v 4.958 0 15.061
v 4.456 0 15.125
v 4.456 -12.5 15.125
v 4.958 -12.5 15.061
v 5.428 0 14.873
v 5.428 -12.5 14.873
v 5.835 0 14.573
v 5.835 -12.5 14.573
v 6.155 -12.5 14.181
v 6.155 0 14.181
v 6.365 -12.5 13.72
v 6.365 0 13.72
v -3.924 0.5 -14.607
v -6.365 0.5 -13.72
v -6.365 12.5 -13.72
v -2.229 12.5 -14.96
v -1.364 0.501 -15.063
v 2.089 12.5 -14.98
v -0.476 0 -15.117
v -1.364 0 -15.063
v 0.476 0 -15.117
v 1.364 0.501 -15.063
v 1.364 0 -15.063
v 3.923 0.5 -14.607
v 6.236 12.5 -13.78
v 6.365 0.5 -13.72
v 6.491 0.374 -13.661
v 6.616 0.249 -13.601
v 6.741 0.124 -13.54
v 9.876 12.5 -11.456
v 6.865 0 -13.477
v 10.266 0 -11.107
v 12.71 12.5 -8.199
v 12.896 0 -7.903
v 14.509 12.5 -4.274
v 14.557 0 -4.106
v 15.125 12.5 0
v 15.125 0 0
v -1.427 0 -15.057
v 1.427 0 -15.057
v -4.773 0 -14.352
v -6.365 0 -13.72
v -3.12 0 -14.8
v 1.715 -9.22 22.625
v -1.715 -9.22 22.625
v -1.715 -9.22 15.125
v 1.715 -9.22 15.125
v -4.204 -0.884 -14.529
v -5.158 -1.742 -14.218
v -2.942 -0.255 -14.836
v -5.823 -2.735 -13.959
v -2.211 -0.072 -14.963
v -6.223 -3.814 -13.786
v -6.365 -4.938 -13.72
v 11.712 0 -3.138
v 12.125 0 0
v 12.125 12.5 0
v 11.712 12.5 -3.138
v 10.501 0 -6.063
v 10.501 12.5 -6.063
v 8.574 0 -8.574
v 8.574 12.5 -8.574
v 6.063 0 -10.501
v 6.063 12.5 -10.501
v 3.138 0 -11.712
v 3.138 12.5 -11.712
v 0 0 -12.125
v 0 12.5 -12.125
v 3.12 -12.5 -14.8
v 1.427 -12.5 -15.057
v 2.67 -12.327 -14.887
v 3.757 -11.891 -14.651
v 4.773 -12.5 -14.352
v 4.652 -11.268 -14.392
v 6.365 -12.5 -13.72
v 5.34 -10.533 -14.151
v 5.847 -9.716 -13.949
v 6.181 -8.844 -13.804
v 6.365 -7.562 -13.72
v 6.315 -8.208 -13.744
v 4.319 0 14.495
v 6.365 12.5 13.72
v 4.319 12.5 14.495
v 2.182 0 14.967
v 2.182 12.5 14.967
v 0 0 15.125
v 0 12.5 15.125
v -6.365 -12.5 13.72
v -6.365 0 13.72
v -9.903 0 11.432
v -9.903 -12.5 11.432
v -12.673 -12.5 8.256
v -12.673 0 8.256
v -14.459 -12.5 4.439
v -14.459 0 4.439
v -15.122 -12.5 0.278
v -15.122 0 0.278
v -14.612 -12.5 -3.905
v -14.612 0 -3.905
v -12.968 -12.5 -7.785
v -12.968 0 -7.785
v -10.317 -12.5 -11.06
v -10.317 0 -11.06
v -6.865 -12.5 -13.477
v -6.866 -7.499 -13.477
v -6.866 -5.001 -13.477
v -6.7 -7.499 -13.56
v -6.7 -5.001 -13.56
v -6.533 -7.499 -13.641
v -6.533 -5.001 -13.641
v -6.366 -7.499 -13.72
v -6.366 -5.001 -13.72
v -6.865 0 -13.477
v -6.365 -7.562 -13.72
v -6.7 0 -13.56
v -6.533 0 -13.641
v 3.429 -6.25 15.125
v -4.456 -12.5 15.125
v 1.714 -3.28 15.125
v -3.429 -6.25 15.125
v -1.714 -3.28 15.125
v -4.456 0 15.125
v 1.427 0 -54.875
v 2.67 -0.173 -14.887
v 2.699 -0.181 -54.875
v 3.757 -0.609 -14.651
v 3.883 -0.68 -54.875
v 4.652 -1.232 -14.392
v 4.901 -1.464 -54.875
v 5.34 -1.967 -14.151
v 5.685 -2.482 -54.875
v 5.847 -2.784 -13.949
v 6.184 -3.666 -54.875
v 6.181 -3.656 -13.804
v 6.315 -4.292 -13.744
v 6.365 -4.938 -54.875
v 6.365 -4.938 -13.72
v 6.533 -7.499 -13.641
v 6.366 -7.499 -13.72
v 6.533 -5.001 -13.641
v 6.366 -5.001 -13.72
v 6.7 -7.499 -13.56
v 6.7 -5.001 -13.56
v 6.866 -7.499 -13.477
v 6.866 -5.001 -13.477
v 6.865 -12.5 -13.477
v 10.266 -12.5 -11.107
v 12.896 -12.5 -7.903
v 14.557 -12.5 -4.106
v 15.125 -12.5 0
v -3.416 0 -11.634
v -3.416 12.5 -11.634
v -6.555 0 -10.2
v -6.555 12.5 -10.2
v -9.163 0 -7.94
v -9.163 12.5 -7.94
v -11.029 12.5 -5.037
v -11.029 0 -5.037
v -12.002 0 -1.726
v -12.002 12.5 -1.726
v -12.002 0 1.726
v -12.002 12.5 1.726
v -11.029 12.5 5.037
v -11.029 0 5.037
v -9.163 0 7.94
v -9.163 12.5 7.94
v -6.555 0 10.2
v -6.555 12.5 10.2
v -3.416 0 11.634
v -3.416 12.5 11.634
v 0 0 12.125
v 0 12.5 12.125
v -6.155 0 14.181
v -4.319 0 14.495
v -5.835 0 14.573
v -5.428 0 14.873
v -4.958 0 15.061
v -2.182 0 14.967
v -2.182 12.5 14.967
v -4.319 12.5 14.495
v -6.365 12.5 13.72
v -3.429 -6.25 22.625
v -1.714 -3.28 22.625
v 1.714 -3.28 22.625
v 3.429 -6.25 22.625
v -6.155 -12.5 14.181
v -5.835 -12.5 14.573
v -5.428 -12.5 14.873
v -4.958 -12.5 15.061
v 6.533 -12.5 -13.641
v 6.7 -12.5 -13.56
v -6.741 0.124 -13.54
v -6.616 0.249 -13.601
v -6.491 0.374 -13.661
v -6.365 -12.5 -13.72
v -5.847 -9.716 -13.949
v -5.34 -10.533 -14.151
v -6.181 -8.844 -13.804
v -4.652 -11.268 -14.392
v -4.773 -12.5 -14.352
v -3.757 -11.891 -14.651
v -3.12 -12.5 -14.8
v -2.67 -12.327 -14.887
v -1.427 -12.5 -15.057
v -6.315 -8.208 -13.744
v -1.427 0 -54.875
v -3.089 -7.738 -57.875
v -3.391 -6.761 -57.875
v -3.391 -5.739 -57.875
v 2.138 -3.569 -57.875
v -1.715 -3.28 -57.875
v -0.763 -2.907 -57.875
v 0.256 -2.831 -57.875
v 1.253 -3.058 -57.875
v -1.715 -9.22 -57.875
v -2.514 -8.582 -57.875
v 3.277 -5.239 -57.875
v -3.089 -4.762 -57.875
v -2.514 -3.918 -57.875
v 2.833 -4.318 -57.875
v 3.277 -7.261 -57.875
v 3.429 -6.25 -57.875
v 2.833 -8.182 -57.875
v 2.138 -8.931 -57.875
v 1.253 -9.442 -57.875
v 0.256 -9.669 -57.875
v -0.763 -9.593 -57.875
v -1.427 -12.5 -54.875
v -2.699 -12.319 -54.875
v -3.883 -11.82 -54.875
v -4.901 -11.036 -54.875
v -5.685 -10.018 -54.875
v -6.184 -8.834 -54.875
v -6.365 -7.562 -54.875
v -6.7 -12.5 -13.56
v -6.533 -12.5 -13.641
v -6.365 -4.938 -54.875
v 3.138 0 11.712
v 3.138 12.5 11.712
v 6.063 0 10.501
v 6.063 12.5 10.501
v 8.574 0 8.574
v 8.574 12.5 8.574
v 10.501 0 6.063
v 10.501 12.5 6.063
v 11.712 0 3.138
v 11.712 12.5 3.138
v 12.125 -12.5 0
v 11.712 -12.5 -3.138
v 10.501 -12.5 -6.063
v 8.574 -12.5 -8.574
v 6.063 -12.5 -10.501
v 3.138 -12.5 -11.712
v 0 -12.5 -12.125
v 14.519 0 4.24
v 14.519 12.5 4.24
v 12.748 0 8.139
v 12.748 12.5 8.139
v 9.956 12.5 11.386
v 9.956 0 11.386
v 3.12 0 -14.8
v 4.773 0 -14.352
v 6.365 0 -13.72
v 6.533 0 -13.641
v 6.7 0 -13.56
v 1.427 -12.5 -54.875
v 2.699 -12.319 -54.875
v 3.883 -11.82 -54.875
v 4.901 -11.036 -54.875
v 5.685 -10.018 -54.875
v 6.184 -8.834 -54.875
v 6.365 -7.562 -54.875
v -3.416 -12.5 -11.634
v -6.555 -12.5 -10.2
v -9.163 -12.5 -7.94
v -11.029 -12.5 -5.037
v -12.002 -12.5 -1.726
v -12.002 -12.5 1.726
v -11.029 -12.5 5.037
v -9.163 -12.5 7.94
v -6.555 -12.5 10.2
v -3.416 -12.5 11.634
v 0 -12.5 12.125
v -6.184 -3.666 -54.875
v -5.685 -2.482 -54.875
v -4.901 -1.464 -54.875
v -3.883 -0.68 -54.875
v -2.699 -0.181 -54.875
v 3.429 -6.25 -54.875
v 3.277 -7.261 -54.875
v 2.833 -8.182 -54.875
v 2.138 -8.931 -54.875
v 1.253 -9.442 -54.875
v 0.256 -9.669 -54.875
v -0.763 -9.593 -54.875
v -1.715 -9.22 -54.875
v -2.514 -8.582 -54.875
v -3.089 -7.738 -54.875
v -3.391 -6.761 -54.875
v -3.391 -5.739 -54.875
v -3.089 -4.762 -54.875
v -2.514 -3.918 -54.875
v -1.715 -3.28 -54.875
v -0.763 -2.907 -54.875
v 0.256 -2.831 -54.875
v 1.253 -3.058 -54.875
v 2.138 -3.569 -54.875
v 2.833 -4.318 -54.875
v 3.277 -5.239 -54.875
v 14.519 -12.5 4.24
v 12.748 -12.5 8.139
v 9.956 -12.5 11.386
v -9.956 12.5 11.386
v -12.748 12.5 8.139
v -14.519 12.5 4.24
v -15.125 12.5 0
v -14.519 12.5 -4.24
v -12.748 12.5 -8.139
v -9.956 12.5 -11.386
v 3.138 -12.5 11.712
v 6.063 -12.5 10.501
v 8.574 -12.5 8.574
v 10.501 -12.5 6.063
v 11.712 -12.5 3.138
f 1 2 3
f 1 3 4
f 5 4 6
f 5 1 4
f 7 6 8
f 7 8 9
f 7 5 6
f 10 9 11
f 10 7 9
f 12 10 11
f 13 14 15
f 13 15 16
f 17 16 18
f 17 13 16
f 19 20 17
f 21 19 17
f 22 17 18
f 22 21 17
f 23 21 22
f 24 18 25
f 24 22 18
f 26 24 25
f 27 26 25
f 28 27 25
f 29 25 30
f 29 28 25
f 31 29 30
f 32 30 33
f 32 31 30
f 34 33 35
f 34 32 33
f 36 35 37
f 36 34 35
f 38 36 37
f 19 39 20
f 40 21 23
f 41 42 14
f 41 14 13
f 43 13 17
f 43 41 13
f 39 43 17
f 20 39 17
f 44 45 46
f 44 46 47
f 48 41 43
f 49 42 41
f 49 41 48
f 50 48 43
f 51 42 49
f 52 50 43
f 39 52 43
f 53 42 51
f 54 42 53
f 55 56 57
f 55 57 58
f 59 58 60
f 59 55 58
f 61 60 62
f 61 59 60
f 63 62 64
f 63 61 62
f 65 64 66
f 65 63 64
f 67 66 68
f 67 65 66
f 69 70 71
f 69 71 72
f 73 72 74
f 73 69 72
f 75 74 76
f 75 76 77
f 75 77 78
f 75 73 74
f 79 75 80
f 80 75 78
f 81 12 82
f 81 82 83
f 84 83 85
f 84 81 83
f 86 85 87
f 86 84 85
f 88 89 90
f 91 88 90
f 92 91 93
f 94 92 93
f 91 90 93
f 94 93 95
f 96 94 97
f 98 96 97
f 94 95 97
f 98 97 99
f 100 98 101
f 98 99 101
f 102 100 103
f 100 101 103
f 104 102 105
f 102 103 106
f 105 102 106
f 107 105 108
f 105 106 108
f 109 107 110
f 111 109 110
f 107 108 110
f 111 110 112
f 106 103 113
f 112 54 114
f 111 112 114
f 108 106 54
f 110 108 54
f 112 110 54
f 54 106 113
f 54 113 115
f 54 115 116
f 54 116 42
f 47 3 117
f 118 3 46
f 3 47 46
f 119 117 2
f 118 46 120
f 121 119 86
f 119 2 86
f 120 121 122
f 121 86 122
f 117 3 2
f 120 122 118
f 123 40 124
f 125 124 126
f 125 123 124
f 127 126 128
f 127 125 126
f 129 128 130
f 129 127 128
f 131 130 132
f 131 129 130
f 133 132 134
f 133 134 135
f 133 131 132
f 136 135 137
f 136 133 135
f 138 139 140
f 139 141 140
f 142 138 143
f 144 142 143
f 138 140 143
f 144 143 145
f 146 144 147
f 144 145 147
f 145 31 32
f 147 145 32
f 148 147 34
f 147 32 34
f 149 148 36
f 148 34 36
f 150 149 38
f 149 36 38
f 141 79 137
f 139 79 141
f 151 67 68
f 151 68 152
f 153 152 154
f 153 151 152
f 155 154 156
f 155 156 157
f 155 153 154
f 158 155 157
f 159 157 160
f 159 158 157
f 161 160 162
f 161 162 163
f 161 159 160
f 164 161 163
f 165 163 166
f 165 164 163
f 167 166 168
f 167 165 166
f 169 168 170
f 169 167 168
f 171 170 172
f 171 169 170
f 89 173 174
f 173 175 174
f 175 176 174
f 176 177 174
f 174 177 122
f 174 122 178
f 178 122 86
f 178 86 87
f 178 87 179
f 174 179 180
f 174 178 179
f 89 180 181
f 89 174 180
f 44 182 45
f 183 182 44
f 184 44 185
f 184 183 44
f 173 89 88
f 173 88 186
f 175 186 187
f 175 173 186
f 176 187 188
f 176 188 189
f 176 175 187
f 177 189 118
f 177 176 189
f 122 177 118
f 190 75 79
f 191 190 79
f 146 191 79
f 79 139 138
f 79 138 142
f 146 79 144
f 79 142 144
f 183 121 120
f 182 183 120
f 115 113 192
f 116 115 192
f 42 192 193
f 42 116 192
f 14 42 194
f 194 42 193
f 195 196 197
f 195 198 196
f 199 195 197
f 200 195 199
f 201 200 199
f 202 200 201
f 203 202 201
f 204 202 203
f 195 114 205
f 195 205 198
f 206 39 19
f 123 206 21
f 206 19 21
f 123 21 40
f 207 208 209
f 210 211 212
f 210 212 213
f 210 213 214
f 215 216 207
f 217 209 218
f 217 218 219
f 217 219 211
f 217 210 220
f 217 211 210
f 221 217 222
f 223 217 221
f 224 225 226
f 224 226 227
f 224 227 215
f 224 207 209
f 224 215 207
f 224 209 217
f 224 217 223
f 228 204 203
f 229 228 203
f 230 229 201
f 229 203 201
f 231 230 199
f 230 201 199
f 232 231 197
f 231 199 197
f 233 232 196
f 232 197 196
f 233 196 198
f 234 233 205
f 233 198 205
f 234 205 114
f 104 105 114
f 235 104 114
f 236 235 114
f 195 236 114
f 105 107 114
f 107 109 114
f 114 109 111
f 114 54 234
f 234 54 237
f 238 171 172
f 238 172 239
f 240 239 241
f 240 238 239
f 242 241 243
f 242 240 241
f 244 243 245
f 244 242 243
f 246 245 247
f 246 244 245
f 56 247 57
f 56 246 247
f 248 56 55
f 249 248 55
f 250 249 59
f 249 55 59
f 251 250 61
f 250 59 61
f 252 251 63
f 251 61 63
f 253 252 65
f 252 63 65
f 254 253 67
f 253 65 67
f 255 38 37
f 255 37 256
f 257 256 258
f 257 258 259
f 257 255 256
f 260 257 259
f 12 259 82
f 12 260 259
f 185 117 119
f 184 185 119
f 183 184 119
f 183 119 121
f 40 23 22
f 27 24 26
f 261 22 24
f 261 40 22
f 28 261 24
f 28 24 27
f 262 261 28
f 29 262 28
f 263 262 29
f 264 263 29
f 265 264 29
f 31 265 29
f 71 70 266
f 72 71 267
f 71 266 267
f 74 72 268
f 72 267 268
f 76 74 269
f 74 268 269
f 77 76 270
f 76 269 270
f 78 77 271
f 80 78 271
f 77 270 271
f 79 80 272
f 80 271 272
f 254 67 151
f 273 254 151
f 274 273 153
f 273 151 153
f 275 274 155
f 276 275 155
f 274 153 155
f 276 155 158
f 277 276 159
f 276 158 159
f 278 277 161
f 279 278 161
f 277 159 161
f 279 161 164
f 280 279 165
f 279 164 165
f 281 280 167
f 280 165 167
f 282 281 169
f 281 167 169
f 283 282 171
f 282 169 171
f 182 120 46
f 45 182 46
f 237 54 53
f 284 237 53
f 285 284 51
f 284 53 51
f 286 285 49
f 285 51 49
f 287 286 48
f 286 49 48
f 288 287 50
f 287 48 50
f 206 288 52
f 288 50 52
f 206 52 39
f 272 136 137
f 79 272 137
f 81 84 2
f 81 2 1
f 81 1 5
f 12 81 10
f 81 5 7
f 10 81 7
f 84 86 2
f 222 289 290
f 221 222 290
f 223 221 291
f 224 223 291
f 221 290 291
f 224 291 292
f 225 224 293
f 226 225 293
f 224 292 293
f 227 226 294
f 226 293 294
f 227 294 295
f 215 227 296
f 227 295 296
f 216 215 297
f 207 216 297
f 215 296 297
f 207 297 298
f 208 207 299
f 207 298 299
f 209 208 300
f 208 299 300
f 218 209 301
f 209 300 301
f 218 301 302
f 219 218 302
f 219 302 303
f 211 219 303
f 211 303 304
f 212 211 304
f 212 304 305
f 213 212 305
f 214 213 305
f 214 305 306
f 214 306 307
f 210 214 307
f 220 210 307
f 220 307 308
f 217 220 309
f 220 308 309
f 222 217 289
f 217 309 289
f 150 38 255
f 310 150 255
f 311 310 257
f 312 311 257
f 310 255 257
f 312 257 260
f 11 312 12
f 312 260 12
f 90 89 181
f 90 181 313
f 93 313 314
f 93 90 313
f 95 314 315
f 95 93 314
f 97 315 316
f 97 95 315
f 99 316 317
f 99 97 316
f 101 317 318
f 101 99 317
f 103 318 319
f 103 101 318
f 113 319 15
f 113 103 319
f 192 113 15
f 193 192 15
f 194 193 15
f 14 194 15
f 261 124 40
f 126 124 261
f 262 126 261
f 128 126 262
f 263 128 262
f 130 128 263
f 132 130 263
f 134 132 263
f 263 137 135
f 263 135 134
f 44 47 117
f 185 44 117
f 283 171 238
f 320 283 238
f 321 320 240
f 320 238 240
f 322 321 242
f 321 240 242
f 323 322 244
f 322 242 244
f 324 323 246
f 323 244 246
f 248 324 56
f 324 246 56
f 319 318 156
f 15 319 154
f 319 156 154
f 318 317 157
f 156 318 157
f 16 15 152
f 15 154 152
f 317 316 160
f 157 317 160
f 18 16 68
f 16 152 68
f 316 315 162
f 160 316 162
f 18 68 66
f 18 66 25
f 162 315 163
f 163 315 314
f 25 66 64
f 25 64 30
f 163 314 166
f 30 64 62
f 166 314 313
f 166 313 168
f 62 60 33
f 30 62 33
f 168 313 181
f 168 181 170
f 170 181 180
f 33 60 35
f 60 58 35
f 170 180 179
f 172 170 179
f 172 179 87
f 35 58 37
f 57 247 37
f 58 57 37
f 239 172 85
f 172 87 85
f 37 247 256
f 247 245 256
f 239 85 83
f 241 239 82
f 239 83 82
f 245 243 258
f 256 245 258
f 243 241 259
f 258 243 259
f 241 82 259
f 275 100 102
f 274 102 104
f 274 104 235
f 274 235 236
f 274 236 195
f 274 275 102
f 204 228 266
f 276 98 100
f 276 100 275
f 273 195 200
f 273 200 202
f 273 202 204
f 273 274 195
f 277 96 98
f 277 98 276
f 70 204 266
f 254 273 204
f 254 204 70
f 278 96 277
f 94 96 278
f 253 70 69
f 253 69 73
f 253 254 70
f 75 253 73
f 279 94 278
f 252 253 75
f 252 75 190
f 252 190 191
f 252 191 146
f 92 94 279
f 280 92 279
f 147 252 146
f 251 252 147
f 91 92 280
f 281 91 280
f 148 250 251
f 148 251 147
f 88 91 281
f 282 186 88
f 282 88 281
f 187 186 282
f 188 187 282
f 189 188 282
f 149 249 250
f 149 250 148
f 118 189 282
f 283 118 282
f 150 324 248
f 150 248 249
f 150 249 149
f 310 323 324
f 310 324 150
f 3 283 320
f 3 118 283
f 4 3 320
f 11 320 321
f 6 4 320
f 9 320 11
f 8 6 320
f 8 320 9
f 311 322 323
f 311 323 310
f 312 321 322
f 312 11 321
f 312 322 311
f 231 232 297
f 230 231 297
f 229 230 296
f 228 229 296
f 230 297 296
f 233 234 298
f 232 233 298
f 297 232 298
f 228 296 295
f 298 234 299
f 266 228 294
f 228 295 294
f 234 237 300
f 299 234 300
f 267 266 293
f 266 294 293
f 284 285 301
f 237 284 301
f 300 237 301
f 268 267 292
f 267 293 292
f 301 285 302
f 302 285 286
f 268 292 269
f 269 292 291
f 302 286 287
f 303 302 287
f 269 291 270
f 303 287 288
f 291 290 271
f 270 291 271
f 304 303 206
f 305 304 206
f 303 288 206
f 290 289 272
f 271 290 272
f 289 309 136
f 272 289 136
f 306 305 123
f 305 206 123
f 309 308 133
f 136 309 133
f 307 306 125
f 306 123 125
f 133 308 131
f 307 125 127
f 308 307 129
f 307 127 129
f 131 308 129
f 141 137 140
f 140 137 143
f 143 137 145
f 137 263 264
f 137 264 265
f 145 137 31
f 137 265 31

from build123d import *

# Parameters (mm, degrees)
F1_DEPTH     = 12.5
F2_DEPTH     = 12.5
F3_DEPTH     = 12.5
F6_DEPTH     = 7.5
F5_R         = 3.429
F7_DEPTH     = 3
F8_T4_DEPTH  = 66.159380005
F8_S5_R      = 15.125
F8_T6_DEPTH  = 35
F8_T10_DEPTH = 66.159380005
F8_S11_R     = 15.125
F8_T12_DEPTH = 35
F8_T16_DEPTH = 66.159380005
F8_S17_R     = 15.125
F8_T18_DEPTH = 35
F8_T22_DEPTH = 66.159380005
F8_S23_R     = 15.125
F8_T24_DEPTH = 35
F9_T1_DEPTH  = 22.0465191056


# Not quite as in the source:
# - a fillet or chamfer that OpenCascade refuses, or shapes differently, is made with other operations: its cross-section is extruded or revolved along the edge and cut away or added


with BuildPart() as f1:
    # F0 (on Front) → F1 (new body, symmetric)
    with BuildSketch(Plane.XZ):
        with BuildLine():
            Line((-6.3651329838, -12.125), (-6.3651329838, -13.7204485021))
            ThreePointArc((-6.3651329838, -13.7204485021), (0, -15.125), (6.3651329838, -13.7204485021))
            Line((6.3651329838, -13.7204485021), (6.3651329838, -12.125))
            Line((6.3651329838, -12.125), (0, -12.125))
            Line((0, -12.125), (-6.3651329838, -12.125))
        make_face()
        with BuildLine():
            ThreePointArc((6.3651329838, 13.7204485021), (3.2591288258, 14.7696887001), (0, 15.125))
            ThreePointArc((0, 15.125), (-3.2591288258, 14.7696887001), (-6.3651329838, 13.7204485021))
            Line((-6.3651329838, 13.7204485021), (-6.3651329838, 12.125))
            Line((-6.3651329838, 12.125), (0, 12.125))
            Line((0, 12.125), (6.3651329838, 12.125))
            Line((6.3651329838, 12.125), (6.3651329838, 13.7204485021))
        make_face()
        with BuildLine():
            ThreePointArc((15.125, 0), (12.7482991293, 8.1391949424), (6.3651329838, 13.7204485021))
            Line((6.3651329838, 13.7204485021), (6.3651329838, 12.125))
            Line((6.3651329838, 12.125), (0, 12.125))
            ThreePointArc((0, 12.125), (8.5736697219, 8.5736697219), (12.125, 0))
            ThreePointArc((12.125, 0), (8.5736697219, -8.5736697219), (0, -12.125))
            Line((0, -12.125), (6.3651329838, -12.125))
            Line((6.3651329838, -12.125), (6.3651329838, -13.7204485021))
            ThreePointArc((6.3651329838, -13.7204485021), (12.7482991293, -8.1391949424), (15.125, 0))
        make_face()
        with BuildLine():
            Line((-6.3651329838, 12.125), (-6.3651329838, 13.7204485021))
            ThreePointArc((-6.3651329838, 13.7204485021), (-15.125, 0), (-6.3651329838, -13.7204485021))
            Line((-6.3651329838, -13.7204485021), (-6.3651329838, -12.125))
            Line((-6.3651329838, -12.125), (0, -12.125))
            ThreePointArc((0, -12.125), (-12.125, 0), (0, 12.125))
            Line((0, 12.125), (-6.3651329838, 12.125))
        make_face()
    extrude(amount=F1_DEPTH, both=True)

    # F0 (on Front) → F2 (join, through all)
    with BuildSketch(Plane.XZ):
        with BuildLine():
            ThreePointArc((6.3651329838, -13.7204485021), (0, -15.125), (-6.3651329838, -13.7204485021))
            Line((-6.3651329838, -13.7204485021), (-6.3651329838, -54.875))
            Line((-6.3651329838, -54.875), (6.3651329838, -54.875))
            Line((6.3651329838, -54.875), (6.3651329838, -13.7204485021))
        make_face()
    extrude(amount=F2_DEPTH)

    # F0 (on Front) → F3 (join, through all)
    with BuildSketch(Plane.XZ):
        with BuildLine():
            Line((6.3651329838, 15.125), (0, 15.125))
            ThreePointArc((0, 15.125), (3.2591288258, 14.7696887001), (6.3651329838, 13.7204485021))
            Line((6.3651329838, 13.7204485021), (6.3651329838, 15.125))
        make_face()
        with BuildLine():
            Line((0, 15.125), (-6.3651329838, 15.125))
            Line((-6.3651329838, 15.125), (-6.3651329838, 13.7204485021))
            ThreePointArc((-6.3651329838, 13.7204485021), (-3.2591288258, 14.7696887001), (0, 15.125))
        make_face()
    extrude(amount=F3_DEPTH)

    # F4 (on face) → F6 (join)
    with BuildSketch(Plane.XY.offset(15.125)):
        Polygon((1.7145000001, -9.2196011096), (3.4290000001, -6.25), (1.7144999999, -3.2803988905), (-1.7145, -3.2803988907), (-3.4289999999, -6.25), (-1.7145000001, -9.2196011096), align=None)
    extrude(amount=F6_DEPTH)

    # F5 (on face) → F7 (join)
    with BuildSketch(Plane(origin=(0, 0, -54.875), x_dir=(1, 0, 0), z_dir=(0, 0, -1))):
        with Locations((0, 6.2500000003)):
            Circle(F5_R)
    extrude(amount=F7_DEPTH)

    # F8: fillet of radius 5 on 6 edges, made by hand


with BuildPart() as f8_tool2:
    # F8_s3 → F8_t4 (new body)
    with BuildSketch(Plane.XY.offset(-67.3774142536)):
        with BuildLine():
            ThreePointArc((1.3641672983, 0.0004), (4.9006668897, -1.4644660941), (6.3655329838, -5.0009656854))
            Line((6.3655329838, -5.0009656854), (6.8656695523, -5.0009656854))
            ThreePointArc((6.8656695523, -5.0009656854), (6.8652695523, -2.5004828427), (6.8652695523, 0))
            Line((6.8652695523, 0), (6.3651329838, 0.5001365685))
            ThreePointArc((6.3651329838, 0.5001365685), (3.8646501411, 0.5001365685), (1.3641672983, 0.5005365685))
            Line((1.3641672983, 0.5005365685), (1.3641672983, 0.0004))
        make_face()
    extrude(amount=F8_T4_DEPTH)

    # F8_s5 → F8_t6 (cut, symmetric)
    with BuildSketch(Plane.XZ.offset(2.3)):
        Circle(F8_S5_R)
    extrude(amount=F8_T6_DEPTH, both=True, mode=Mode.SUBTRACT)


with BuildPart() as f1_1:
    add(f1.part)

    # F8_t1: cut F8_tool2
    add(f8_tool2.part, mode=Mode.SUBTRACT)


with BuildPart() as f8_tool8:
    # F8_s9 → F8_t10 (new body)
    with BuildSketch(Plane.XY.offset(-1.2180342485)):
        with BuildLine():
            ThreePointArc((-6.3655329838, -5.0009656854), (-4.9006668897, -1.4644660941), (-1.3641672983, 0.0004))
            Line((-1.3641672983, 0.0004), (-1.3641672983, 0.5005365685))
            ThreePointArc((-1.3641672983, 0.5005365685), (-3.8646501411, 0.5001365685), (-6.3651329838, 0.5001365685))
            Line((-6.3651329838, 0.5001365685), (-6.8652695523, 0))
            ThreePointArc((-6.8652695523, 0), (-6.8652695523, -2.5004828427), (-6.8656695523, -5.0009656854))
            Line((-6.8656695523, -5.0009656854), (-6.3655329838, -5.0009656854))
        make_face()
    extrude(amount=-F8_T10_DEPTH)

    # F8_s11 → F8_t12 (cut, symmetric)
    with BuildSketch(Plane.XZ.offset(2.3)):
        Circle(F8_S11_R)
    extrude(amount=F8_T12_DEPTH, both=True, mode=Mode.SUBTRACT)


with BuildPart() as f1_2:
    add(f1_1.part)

    # F8_t7: cut F8_tool8
    add(f8_tool8.part, mode=Mode.SUBTRACT)


with BuildPart() as f8_tool14:
    # F8_s15 → F8_t16 (new body)
    with BuildSketch(Plane.XY.offset(-67.3774142536)):
        with BuildLine():
            ThreePointArc((1.3641672983, -12.5004), (4.9006668897, -11.0355339059), (6.3655329838, -7.4990343146))
            Line((6.3655329838, -7.4990343146), (6.8656695523, -7.4990343146))
            ThreePointArc((6.8656695523, -7.4990343146), (6.8652695523, -9.9995171573), (6.8652695523, -12.5))
            Line((6.8652695523, -12.5), (6.3651329838, -13.0001365685))
            ThreePointArc((6.3651329838, -13.0001365685), (3.8646501411, -13.0001365685), (1.3641672983, -13.0005365685))
            Line((1.3641672983, -13.0005365685), (1.3641672983, -12.5004))
        make_face()
    extrude(amount=F8_T16_DEPTH)

    # F8_s17 → F8_t18 (cut, symmetric)
    with BuildSketch(Plane.XZ.offset(10.2)):
        Circle(F8_S17_R)
    extrude(amount=F8_T18_DEPTH, both=True, mode=Mode.SUBTRACT)


with BuildPart() as f1_3:
    add(f1_2.part)

    # F8_t13: cut F8_tool14
    add(f8_tool14.part, mode=Mode.SUBTRACT)


with BuildPart() as f8_tool20:
    # F8_s21 → F8_t22 (new body)
    with BuildSketch(Plane.XY.offset(-1.2180342485)):
        with BuildLine():
            ThreePointArc((-1.3641672983, -12.5004), (-4.9006668897, -11.0355339059), (-6.3655329838, -7.4990343146))
            Line((-6.3655329838, -7.4990343146), (-6.8656695523, -7.4990343146))
            ThreePointArc((-6.8656695523, -7.4990343146), (-6.8652695523, -9.9995171573), (-6.8652695523, -12.5))
            Line((-6.8652695523, -12.5), (-6.3651329838, -13.0001365685))
            ThreePointArc((-6.3651329838, -13.0001365685), (-3.8646501411, -13.0001365685), (-1.3641672983, -13.0005365685))
            Line((-1.3641672983, -13.0005365685), (-1.3641672983, -12.5004))
        make_face()
    extrude(amount=-F8_T22_DEPTH)

    # F8_s23 → F8_t24 (cut, symmetric)
    with BuildSketch(Plane.XZ.offset(10.2)):
        Circle(F8_S23_R)
    extrude(amount=F8_T24_DEPTH, both=True, mode=Mode.SUBTRACT)


with BuildPart() as f1_4:
    add(f1_3.part)

    # F8_t19: cut F8_tool20
    add(f8_tool20.part, mode=Mode.SUBTRACT)

    # F9: fillet of radius 2 on 2 edges, made by hand

    # F9_s2 → F9_t1 (cut)
    with BuildSketch(Plane.XZ.offset(-4.7732595528)):
        with BuildLine():
            ThreePointArc((-6.3651329838, 13.7204485021), (-5.6409669175, 14.7360395719), (-4.4558291627, 15.125))
            Line((-4.4558291627, 15.125), (-6.3651329838, 15.125))
            Line((-6.3651329838, 15.125), (-6.3651329838, 13.7204485021))
        make_face()
        with BuildLine():
            ThreePointArc((4.4558291627, 15.125), (5.6409669175, 14.7360395719), (6.3651329838, 13.7204485021))
            Line((6.3651329838, 13.7204485021), (6.3651329838, 15.125))
            Line((6.3651329838, 15.125), (4.4558291627, 15.125))
        make_face()
    extrude(amount=F9_T1_DEPTH, mode=Mode.SUBTRACT)


solid = f1_4.part
